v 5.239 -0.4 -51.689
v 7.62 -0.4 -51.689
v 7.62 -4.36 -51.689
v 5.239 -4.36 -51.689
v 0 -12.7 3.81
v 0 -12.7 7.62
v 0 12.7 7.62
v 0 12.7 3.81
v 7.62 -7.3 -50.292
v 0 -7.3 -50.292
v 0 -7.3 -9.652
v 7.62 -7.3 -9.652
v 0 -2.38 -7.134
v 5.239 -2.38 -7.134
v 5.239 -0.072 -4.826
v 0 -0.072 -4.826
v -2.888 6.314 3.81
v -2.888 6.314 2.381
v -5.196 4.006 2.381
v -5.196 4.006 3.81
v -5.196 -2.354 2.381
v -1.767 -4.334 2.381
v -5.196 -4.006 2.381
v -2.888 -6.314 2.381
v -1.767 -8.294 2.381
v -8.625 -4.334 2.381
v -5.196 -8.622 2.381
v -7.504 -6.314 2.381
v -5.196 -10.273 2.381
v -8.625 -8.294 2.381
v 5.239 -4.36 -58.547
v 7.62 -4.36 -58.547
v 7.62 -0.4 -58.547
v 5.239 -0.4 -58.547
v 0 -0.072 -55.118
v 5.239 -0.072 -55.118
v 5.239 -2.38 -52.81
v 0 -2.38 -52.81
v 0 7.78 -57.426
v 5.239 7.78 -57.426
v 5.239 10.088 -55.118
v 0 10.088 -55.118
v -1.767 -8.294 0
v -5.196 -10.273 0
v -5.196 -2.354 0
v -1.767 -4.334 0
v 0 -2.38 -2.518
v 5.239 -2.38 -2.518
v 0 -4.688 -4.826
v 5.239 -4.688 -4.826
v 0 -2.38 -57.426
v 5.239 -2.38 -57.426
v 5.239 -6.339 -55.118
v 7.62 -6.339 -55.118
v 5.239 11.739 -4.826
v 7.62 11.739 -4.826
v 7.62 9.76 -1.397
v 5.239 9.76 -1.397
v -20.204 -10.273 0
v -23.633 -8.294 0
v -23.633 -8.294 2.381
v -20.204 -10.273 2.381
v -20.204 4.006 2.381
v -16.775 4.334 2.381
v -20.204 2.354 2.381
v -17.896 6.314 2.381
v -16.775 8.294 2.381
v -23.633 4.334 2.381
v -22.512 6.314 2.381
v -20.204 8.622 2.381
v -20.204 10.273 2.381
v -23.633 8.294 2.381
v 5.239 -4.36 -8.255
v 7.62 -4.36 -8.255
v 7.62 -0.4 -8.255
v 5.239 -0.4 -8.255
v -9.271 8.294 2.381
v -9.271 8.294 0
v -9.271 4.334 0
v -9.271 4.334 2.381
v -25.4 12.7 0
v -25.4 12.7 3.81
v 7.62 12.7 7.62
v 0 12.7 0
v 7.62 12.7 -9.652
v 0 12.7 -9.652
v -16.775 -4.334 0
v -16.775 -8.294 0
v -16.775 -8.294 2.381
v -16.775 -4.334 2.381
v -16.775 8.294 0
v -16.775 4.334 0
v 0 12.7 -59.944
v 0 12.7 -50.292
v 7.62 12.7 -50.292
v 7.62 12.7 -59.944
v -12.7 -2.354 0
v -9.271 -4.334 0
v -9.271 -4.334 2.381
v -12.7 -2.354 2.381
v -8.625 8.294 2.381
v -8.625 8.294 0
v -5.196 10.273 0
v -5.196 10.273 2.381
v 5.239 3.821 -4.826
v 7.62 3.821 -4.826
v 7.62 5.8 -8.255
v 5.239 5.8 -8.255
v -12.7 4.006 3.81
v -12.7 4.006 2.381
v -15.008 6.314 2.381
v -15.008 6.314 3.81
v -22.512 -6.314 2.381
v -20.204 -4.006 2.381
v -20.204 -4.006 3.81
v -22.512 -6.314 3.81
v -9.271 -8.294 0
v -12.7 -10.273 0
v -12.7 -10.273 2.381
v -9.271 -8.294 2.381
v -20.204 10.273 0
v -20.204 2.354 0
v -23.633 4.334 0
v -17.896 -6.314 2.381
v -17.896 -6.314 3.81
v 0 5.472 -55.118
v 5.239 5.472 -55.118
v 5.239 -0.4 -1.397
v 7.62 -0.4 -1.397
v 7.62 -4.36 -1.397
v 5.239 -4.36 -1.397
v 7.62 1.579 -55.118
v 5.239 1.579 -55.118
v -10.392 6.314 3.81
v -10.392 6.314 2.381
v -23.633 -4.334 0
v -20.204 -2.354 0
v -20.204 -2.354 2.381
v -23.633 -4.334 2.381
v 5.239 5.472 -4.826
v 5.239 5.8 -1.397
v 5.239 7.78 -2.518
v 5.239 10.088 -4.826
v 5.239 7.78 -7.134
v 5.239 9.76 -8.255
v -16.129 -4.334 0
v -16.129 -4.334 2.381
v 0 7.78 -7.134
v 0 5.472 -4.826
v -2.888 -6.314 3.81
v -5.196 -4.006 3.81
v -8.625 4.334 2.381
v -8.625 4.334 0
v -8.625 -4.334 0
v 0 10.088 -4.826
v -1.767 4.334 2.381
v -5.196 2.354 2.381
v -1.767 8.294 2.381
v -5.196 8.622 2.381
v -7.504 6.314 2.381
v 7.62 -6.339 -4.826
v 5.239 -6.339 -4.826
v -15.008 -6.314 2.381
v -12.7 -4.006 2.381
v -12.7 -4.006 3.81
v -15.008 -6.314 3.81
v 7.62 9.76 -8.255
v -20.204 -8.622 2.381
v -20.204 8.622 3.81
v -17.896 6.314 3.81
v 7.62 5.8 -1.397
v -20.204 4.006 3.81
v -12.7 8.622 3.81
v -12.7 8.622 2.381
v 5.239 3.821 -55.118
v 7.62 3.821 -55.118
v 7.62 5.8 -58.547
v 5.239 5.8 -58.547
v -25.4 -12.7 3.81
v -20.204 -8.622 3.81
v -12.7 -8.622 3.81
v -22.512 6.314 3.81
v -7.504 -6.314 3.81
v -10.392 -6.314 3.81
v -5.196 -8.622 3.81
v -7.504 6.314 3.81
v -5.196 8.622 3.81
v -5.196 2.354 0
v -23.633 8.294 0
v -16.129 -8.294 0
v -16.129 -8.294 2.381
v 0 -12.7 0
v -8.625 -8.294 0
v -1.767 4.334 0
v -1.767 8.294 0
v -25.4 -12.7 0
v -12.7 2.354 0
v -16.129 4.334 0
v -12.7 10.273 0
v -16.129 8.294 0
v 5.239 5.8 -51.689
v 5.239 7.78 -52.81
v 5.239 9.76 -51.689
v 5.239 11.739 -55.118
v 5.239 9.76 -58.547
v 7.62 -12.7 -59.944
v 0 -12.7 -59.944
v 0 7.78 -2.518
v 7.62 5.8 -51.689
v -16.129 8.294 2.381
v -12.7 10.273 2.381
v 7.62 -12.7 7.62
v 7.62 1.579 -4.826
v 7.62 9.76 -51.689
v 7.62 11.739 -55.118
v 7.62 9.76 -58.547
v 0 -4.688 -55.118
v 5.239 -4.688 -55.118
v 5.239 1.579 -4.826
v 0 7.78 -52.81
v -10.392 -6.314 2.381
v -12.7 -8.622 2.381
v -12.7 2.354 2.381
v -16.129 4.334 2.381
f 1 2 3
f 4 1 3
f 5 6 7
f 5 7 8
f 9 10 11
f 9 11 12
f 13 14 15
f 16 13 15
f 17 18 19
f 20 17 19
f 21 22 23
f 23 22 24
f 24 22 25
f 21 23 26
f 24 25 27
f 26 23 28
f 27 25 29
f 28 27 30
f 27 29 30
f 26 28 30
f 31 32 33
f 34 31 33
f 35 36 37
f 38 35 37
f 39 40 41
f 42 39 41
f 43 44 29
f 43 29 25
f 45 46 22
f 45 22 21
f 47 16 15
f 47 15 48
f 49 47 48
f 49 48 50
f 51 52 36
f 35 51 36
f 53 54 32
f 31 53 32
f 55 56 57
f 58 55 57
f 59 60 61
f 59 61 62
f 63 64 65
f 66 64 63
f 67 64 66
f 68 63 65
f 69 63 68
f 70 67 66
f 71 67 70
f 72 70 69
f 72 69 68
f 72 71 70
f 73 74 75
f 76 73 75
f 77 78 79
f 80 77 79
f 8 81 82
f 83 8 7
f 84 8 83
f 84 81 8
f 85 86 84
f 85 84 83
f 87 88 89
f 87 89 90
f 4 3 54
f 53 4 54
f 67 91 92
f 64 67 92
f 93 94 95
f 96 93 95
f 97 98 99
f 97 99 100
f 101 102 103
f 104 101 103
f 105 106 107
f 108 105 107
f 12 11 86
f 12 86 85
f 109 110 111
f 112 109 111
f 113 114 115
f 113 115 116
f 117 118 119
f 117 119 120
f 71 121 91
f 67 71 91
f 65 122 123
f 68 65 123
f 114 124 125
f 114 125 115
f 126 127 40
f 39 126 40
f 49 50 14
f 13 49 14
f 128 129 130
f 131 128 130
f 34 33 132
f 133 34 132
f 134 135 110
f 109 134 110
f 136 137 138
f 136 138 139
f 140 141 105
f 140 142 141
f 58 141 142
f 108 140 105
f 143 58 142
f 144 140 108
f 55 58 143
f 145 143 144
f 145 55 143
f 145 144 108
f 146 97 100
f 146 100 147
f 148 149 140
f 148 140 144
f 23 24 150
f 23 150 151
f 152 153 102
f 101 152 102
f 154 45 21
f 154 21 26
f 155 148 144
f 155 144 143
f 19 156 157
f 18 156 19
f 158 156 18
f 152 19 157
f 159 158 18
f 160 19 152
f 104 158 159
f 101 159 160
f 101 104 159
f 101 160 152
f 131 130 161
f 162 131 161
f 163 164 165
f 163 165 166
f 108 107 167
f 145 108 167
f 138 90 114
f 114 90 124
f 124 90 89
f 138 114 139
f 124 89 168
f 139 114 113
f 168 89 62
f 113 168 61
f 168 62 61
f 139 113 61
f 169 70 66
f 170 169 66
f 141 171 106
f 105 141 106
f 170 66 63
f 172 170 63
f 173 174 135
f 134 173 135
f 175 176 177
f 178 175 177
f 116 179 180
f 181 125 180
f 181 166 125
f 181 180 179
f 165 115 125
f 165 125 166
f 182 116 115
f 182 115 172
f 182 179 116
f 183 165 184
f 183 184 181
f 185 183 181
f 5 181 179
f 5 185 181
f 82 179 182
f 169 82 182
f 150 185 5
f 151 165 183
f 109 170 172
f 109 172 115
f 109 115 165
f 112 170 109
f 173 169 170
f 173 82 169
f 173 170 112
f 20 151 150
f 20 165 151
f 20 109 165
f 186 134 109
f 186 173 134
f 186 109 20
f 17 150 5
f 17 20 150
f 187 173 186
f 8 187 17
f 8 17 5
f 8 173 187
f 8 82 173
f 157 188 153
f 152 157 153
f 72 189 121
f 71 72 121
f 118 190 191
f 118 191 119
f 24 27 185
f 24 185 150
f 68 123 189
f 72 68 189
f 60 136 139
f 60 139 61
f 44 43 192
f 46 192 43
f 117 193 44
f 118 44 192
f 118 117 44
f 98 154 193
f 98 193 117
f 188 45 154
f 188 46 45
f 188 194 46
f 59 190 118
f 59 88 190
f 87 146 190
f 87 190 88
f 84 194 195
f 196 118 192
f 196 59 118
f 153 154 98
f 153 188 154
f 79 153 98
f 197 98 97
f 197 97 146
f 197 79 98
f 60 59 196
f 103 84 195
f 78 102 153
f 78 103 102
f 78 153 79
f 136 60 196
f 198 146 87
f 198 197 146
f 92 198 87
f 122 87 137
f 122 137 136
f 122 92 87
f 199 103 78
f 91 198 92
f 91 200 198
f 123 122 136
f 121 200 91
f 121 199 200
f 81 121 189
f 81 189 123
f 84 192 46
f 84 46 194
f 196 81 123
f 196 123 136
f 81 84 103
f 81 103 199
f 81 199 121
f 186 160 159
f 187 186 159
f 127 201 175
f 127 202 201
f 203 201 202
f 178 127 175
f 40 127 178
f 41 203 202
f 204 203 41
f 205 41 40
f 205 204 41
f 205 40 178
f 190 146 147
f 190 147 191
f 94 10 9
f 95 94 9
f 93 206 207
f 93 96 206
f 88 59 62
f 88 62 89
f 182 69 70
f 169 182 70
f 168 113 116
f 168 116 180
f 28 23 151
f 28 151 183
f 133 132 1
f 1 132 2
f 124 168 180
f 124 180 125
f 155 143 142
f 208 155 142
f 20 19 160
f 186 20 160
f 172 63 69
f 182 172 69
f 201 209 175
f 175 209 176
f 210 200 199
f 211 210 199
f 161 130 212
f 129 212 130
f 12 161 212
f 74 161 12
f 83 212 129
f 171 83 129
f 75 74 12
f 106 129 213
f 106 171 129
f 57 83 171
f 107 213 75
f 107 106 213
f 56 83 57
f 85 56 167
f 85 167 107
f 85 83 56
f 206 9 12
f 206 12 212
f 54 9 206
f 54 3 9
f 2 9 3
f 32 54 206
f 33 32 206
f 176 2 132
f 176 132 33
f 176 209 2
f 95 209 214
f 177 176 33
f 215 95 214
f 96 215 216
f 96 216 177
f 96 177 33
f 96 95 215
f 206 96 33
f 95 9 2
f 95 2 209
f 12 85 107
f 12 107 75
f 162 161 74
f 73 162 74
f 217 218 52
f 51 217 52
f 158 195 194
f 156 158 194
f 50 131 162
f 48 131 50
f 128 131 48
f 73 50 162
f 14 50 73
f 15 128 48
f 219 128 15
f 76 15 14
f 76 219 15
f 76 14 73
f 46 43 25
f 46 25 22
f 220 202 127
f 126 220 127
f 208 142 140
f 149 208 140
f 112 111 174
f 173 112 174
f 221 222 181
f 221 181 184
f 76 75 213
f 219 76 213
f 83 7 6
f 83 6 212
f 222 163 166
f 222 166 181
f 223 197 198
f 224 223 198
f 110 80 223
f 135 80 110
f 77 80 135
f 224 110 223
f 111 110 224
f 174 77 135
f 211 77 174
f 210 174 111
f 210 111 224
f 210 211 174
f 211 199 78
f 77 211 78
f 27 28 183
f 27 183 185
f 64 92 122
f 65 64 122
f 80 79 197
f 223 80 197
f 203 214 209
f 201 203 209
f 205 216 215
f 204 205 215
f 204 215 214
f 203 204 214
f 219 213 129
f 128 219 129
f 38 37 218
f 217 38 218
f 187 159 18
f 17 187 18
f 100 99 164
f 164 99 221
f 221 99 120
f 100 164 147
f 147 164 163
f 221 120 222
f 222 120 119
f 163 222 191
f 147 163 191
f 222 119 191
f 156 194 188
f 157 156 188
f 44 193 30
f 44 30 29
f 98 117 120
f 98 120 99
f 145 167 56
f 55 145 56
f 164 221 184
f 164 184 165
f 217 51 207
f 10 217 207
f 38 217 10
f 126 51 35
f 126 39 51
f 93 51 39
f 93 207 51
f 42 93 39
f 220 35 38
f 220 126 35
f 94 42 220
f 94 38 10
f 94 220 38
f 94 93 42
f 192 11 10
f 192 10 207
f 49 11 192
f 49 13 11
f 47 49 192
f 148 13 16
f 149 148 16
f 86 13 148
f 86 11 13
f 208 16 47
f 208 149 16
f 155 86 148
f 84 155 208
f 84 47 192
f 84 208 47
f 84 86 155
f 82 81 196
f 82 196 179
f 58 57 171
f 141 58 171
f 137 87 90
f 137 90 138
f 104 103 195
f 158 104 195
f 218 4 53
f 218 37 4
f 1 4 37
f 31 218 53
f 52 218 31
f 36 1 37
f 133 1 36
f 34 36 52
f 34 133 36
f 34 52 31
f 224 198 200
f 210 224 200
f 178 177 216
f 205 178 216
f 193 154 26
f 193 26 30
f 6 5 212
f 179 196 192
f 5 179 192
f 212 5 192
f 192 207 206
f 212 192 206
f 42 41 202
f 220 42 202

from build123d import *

# Parameters (mm, degrees)
BOSS_EXTRUDE1_DEPTH = 12.7
SKETCH2_W           = 7.62
SKETCH2_H           = 40.64
CUT_EXTRUDE1_DEPTH  = 20
CUT_EXTRUDE2_DEPTH  = 34.02
CUT_EXTRUDE6_DEPTH  = 2.38125
CUT_EXTRUDE5_DEPTH  = 8.62
CUT_EXTRUDE7_DEPTH  = 2.38125
SKETCH14_W          = 25.4
SKETCH14_H          = 3.81
CUT_EXTRUDE8_DEPTH  = 26.4


with BuildPart() as part:
    # Sketch1 → Boss-Extrude1 (new body, symmetric)
    with BuildSketch(Plane(origin=(0, 0, 0), x_dir=(1, 0, 0), z_dir=(0, 1, 0))):
        Polygon((0, 59.944), (0, 0), (-25.4, 0), (-25.4, -7.62), (7.62, -7.62), (7.62, 59.944), align=None)
    extrude(amount=BOSS_EXTRUDE1_DEPTH, both=True)

    # Sketch2 → Cut-Extrude1 (cut)
    with BuildSketch(Plane(origin=(0, 12.7, 0), x_dir=(1, 0, 0), z_dir=(0, 1, 0))):
        with Locations((3.81, 29.972)):
            Rectangle(SKETCH2_W, SKETCH2_H)
    extrude(amount=-CUT_EXTRUDE1_DEPTH, mode=Mode.SUBTRACT)

    # Sketch3 → Cut-Extrude2 (cut, through all)
    with BuildSketch(Plane(origin=(7.62, 0, 0), x_dir=(0, 0, -1), z_dir=(1, 0, 0))):
        Polygon((55.118, 10.087925823), (52.810074177, 7.78), (55.118, 5.472074177), (57.425925823, 7.78), align=None)
        Polygon((2.518074177, 7.78), (4.826, 5.472074177), (7.133925823, 7.78), (4.826, 10.087925823), align=None)
        Polygon((57.425925823, -2.38), (55.118, -0.072074177), (52.810074177, -2.38), (55.118, -4.687925823), align=None)
        Polygon((4.826, -4.687925823), (7.133925823, -2.38), (4.826, -0.072074177), (2.518074177, -2.38), align=None)
    extrude(amount=-CUT_EXTRUDE2_DEPTH, mode=Mode.SUBTRACT)

    # Sketch12 → Cut-Extrude6 (cut)
    with BuildSketch(Plane(origin=(7.62, 0, 0), x_dir=(0, 0, -1), z_dir=(1, 0, 0))):
        Polygon((8.255, 9.759734073), (4.826, 11.739468146), (1.397, 9.759734073), (1.397, 5.800265927), (4.826, 3.820531854), (8.255, 5.800265927), align=None)
        Polygon((4.826, 1.579468146), (1.397, -0.400265927), (1.397, -4.359734073), (4.826, -6.339468146), (8.255, -4.359734073), (8.255, -0.400265927), align=None)
        Polygon((55.118, 1.579468146), (51.689, -0.400265927), (51.689, -4.359734073), (55.118, -6.339468146), (58.547, -4.359734073), (58.547, -0.400265927), align=None)
        Polygon((55.118, 11.739468146), (51.689, 9.759734073), (51.689, 5.800265927), (55.118, 3.820531854), (58.547, 5.800265927), (58.547, 9.759734073), align=None)
    extrude(amount=-CUT_EXTRUDE6_DEPTH, mode=Mode.SUBTRACT)

    # Sketch9 → Cut-Extrude5 (cut, through all)
    with BuildSketch(Plane(origin=(0, 0, 0), x_dir=(-1, 0, 0), z_dir=(0, 0, -1))):
        Polygon((5.196037088, 4.006037088), (7.503962912, 6.313962912), (5.196037088, 8.621888735), (2.888111265, 6.313962912), align=None)
        Polygon((20.203962912, 4.006037088), (22.511888735, 6.313962912), (20.203962912, 8.621888735), (17.896037088, 6.313962912), align=None)
        Polygon((12.7, 4.006037088), (15.007925823, 6.313962912), (12.7, 8.621888735), (10.392074177, 6.313962912), align=None)
    cut_extrude5 = extrude(amount=-CUT_EXTRUDE5_DEPTH, mode=Mode.SUBTRACT)

    # Sketch13 → Cut-Extrude7 (cut)
    with BuildSketch(Plane(origin=(0, 0, 0), x_dir=(-1, 0, 0), z_dir=(0, 0, -1))):
        Polygon((8.625037088, 4.334228839), (8.625037088, 8.293696985), (5.196037088, 10.273431058), (1.767037088, 8.293696985), (1.767037088, 4.334228839), (5.196037088, 2.354494765), align=None)
        Polygon((12.7, 2.354494765), (16.129, 4.334228839), (16.129, 8.293696985), (12.7, 10.273431058), (9.271, 8.293696985), (9.271, 4.334228839), align=None)
        Polygon((20.203962912, 2.354494765), (23.632962912, 4.334228839), (23.632962912, 8.293696985), (20.203962912, 10.273431058), (16.774962912, 8.293696985), (16.774962912, 4.334228839), align=None)
    cut_extrude7 = extrude(amount=-CUT_EXTRUDE7_DEPTH, mode=Mode.SUBTRACT)

    # Mirror2: Cut-Extrude5, Cut-Extrude7 across plane
    add(cut_extrude5.mirror(Plane.ZX), mode=Mode.SUBTRACT)
    add(cut_extrude7.mirror(Plane.ZX), mode=Mode.SUBTRACT)

    # Sketch14 → Cut-Extrude8 (cut, through all)
    with BuildSketch(Plane(origin=(0, 12.7, 0), x_dir=(1, 0, 0), z_dir=(0, 1, 0))):
        with Locations((-12.7, -5.715)):
            Rectangle(SKETCH14_W, SKETCH14_H)
    extrude(amount=-CUT_EXTRUDE8_DEPTH, mode=Mode.SUBTRACT)


solid = part.part
